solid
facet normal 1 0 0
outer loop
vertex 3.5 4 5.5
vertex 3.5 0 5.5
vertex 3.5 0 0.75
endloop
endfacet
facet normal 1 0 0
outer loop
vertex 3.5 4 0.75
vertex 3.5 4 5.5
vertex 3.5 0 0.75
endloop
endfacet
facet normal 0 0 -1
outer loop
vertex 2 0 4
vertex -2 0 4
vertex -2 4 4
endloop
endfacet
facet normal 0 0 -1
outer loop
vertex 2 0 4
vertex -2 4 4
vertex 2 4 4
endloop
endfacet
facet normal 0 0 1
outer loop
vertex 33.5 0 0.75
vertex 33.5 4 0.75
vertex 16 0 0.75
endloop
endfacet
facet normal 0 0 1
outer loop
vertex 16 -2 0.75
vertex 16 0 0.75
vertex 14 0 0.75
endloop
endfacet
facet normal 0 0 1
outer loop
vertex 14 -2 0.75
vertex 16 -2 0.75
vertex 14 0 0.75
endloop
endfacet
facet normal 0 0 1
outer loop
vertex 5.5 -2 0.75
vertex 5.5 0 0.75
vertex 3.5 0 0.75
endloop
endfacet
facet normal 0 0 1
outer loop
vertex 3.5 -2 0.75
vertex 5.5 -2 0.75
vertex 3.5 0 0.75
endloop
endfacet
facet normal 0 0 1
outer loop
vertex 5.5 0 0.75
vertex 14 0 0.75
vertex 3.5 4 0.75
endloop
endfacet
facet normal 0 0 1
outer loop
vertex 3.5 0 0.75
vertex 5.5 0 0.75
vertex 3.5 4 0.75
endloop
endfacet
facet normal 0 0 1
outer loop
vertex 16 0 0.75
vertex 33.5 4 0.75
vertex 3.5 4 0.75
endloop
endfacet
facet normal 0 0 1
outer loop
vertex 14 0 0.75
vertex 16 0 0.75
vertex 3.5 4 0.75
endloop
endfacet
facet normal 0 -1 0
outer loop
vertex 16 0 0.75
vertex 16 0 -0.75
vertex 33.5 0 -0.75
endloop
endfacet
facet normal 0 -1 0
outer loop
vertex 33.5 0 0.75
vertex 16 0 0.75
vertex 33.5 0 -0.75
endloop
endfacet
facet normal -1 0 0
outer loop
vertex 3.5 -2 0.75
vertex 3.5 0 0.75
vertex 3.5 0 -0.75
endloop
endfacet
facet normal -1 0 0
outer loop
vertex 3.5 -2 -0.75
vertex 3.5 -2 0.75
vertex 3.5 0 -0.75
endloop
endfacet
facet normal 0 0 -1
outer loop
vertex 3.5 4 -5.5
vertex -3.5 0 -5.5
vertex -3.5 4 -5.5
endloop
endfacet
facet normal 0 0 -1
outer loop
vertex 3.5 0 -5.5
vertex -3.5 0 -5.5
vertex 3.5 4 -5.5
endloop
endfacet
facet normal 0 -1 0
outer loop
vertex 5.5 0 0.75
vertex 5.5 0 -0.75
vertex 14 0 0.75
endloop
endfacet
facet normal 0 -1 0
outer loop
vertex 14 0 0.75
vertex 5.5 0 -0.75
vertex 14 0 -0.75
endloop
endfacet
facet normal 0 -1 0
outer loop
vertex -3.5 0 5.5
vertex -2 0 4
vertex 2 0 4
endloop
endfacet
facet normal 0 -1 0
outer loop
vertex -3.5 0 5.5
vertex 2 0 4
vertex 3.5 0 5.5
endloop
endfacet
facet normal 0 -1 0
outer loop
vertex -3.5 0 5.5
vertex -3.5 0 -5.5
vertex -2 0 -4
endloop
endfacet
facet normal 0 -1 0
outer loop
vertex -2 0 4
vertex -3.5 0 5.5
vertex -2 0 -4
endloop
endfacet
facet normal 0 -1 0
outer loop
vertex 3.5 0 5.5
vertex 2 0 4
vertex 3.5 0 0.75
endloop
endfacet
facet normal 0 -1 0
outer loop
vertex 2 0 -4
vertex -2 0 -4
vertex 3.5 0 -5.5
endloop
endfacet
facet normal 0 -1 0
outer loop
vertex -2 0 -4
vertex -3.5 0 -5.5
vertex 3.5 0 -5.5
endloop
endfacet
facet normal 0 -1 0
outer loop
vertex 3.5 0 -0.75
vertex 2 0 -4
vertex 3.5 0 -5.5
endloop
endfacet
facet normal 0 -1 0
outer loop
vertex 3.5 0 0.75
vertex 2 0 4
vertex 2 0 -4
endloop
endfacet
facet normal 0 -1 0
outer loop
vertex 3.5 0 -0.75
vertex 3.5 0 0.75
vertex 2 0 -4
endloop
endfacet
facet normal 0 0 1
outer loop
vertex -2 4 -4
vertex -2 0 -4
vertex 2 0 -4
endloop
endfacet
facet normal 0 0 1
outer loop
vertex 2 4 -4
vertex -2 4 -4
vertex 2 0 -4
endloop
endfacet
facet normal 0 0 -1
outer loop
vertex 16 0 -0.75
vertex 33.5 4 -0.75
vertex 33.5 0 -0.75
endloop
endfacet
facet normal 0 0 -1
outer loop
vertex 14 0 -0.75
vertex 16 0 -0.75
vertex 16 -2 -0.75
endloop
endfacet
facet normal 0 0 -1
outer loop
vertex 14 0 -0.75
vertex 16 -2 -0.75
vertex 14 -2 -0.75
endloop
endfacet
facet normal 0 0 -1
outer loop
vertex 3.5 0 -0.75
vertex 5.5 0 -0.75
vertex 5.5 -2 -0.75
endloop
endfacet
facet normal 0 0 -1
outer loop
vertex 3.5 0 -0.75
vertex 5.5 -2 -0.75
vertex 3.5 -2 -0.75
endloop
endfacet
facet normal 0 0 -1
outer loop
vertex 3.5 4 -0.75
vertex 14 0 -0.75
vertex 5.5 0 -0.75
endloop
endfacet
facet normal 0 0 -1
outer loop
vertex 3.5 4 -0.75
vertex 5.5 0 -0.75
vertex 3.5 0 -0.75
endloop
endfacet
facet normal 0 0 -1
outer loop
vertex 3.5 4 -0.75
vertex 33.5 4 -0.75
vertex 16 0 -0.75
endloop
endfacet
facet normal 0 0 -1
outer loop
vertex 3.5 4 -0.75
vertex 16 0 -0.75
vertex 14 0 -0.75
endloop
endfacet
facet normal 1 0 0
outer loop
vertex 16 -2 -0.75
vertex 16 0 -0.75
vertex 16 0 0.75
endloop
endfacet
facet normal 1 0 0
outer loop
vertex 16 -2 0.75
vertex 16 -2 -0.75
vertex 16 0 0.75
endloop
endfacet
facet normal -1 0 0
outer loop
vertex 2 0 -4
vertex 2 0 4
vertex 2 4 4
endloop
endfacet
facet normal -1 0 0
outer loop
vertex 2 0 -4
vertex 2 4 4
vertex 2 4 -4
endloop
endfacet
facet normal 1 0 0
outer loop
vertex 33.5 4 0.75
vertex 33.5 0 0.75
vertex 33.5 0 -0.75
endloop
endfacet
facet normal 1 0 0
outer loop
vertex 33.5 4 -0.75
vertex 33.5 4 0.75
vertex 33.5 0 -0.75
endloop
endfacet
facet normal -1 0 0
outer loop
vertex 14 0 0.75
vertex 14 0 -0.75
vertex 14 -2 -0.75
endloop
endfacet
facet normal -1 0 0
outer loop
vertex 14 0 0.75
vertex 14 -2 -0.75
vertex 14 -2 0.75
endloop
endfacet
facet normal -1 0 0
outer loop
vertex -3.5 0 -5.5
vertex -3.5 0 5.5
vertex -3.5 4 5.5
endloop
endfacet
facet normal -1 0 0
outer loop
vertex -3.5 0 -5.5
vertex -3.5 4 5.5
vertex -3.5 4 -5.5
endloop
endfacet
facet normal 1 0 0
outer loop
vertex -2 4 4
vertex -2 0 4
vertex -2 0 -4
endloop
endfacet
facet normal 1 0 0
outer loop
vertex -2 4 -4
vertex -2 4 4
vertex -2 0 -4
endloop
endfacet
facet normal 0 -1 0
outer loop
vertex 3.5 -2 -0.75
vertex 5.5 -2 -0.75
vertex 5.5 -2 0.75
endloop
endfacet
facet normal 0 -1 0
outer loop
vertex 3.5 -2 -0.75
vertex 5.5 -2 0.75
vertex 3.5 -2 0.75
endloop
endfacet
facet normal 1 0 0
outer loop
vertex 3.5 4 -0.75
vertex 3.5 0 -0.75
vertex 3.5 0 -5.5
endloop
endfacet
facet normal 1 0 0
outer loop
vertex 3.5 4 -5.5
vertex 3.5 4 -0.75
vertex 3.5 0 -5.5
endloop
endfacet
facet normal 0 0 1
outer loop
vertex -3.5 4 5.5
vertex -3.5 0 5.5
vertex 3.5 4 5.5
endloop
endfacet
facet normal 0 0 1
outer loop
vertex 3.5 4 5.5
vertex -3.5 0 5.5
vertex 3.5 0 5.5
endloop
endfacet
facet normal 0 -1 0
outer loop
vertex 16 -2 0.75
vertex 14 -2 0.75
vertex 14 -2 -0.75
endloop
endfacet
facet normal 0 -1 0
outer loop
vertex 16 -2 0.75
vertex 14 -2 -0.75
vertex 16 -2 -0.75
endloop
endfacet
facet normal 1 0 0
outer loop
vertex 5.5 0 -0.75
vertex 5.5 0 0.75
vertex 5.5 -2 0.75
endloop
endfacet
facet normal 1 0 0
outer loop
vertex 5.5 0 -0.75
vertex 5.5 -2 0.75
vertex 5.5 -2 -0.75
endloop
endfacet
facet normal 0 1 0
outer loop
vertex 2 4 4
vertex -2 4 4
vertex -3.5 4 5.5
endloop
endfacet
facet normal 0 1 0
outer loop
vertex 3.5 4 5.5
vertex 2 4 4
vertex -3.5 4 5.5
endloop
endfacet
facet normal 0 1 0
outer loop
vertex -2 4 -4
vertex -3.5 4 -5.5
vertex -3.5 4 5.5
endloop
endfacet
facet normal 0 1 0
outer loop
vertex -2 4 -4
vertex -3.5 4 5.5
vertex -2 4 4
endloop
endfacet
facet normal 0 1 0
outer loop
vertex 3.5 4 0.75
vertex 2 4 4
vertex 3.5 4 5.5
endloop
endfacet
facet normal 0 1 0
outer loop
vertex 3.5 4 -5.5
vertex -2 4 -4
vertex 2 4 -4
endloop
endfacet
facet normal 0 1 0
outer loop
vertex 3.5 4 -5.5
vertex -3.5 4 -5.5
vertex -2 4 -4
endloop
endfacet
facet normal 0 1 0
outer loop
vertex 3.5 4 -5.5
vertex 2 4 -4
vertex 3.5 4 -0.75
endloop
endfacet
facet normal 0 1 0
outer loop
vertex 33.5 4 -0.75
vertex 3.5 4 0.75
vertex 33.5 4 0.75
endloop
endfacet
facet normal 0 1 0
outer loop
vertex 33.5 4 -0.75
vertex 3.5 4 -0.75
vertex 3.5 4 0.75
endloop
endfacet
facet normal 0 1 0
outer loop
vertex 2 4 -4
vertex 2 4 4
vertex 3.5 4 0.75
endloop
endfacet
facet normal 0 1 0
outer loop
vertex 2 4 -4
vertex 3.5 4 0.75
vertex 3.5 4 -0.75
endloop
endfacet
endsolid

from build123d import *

# Parameters (mm, degrees)
SKETCH1_W           = 30
SKETCH1_H           = 1.5
SKETCH1_W_2         = 7
SKETCH1_H_2         = 11
SKETCH1_W_3         = 4
SKETCH1_H_3         = 8
BOSS_EXTRUDE1_DEPTH = 4
SKETCH2_W           = 2
SKETCH2_H           = 1.5
BOSS_EXTRUDE2_DEPTH = 2
SKETCH3_W           = 2
SKETCH3_H           = 1.5
BOSS_EXTRUDE3_DEPTH = 2


with BuildPart() as part:
    # Sketch1 → Boss-Extrude1 (new body)
    # profile 1 of 2: a face of its own
    with BuildSketch(Plane(origin=(0, 0, 0), x_dir=(1, 0, 0), z_dir=(0, 1, 0))):
        with Locations((18.5, 0)):
            Rectangle(SKETCH1_W, SKETCH1_H)
    # profile 2 of 2: a face of its own
    with BuildSketch(Plane(origin=(0, 0, 0), x_dir=(1, 0, 0), z_dir=(0, 1, 0))):
        Rectangle(SKETCH1_W_2, SKETCH1_H_2)
        Rectangle(SKETCH1_W_3, SKETCH1_H_3, mode=Mode.SUBTRACT)
    extrude(amount=BOSS_EXTRUDE1_DEPTH)

    # Sketch2 → Boss-Extrude2 (add)
    with BuildSketch(Plane.XZ):
        with Locations((15, 0)):
            Rectangle(SKETCH2_W, SKETCH2_H)
    extrude(amount=BOSS_EXTRUDE2_DEPTH)

    # Sketch3 → Boss-Extrude3 (add)
    with BuildSketch(Plane(origin=(0, 0, 0), x_dir=(-1, 0, 0), z_dir=(0, -1, 0))):
        with Locations((-4.5, 0)):
            Rectangle(SKETCH3_W, SKETCH3_H)
    extrude(amount=BOSS_EXTRUDE3_DEPTH)


solid = part.part
